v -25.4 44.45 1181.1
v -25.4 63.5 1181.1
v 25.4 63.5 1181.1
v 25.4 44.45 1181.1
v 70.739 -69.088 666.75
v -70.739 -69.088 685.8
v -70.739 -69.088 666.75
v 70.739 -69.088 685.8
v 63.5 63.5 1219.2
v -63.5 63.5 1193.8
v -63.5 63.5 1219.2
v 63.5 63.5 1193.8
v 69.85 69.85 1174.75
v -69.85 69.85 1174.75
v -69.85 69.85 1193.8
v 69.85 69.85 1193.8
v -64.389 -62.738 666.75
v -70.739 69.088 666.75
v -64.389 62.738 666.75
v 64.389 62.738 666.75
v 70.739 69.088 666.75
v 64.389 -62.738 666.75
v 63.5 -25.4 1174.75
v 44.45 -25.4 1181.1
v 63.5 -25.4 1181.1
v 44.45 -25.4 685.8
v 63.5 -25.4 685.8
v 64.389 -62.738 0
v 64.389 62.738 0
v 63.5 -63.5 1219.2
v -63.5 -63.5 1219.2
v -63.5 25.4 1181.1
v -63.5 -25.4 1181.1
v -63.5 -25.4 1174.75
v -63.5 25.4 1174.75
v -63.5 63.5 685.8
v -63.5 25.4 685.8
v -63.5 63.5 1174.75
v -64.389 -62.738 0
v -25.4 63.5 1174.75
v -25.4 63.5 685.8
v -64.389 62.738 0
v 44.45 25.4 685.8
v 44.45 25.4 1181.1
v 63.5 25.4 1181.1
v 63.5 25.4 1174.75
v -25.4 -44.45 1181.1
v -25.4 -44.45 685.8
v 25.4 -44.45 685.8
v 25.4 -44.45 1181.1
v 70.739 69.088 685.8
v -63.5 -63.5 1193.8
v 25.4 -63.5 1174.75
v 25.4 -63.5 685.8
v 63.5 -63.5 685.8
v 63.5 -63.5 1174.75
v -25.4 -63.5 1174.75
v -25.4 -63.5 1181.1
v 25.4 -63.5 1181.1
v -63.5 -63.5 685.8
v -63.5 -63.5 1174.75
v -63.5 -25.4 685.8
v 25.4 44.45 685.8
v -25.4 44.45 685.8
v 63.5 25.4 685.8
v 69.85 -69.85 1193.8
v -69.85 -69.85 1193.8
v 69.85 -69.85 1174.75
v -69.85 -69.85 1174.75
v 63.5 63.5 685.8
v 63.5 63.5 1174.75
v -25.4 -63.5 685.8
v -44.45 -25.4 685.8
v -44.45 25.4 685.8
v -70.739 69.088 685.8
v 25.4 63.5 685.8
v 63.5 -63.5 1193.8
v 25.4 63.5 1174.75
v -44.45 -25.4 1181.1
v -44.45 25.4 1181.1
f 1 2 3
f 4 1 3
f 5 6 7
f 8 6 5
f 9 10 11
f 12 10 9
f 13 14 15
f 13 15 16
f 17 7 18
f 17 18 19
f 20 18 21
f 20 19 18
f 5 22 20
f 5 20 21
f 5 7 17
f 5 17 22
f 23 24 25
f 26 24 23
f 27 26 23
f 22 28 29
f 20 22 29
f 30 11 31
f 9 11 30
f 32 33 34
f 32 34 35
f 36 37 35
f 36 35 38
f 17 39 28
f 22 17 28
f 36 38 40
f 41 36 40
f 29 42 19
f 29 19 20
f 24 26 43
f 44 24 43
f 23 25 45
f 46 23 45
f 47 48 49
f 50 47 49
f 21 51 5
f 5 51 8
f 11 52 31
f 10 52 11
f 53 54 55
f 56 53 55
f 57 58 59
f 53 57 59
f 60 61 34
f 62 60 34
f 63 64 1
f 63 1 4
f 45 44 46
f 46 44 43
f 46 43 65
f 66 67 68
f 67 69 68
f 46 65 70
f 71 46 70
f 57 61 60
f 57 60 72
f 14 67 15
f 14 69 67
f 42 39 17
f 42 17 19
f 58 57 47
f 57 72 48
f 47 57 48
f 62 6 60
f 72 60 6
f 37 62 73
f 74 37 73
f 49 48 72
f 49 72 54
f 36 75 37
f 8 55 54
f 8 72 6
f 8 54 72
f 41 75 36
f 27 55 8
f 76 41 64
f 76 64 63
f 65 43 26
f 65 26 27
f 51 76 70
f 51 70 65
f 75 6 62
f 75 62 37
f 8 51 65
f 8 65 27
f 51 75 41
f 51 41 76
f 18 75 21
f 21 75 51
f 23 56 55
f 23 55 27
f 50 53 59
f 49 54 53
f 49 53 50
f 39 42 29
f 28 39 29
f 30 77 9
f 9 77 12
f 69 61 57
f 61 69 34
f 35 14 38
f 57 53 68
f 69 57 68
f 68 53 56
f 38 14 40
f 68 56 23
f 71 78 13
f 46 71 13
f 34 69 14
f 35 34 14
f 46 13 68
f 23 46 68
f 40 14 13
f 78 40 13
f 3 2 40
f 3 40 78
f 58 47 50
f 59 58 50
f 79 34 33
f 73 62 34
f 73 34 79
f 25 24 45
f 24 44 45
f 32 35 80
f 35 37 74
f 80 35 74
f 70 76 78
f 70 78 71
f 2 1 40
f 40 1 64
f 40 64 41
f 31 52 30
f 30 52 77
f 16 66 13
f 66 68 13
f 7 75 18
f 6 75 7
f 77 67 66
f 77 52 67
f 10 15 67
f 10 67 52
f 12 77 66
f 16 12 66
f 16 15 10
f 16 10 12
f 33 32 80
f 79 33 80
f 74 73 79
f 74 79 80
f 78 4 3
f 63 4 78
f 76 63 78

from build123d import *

# Parameters (mm, degrees)
F0_W      = 128.778
F0_H      = 125.476
F1_DEPTH  = 673.1
F2_W      = 88.9
F2_H      = 88.9
F3_DEPTH  = 508
F4_W      = 141.477994
F4_H      = 138.175994
F4_W_2    = 88.9
F4_H_2    = 88.9
F5_DEPTH  = 12.7
F6_W      = 141.477994
F6_H      = 138.175994
F6_W_2    = 128.778
F6_H_2    = 125.476
F7_DEPTH  = 6.35
F8_W      = 38.1
F8_H      = 38.1
F9_DEPTH  = 495.3
F10_W     = 139.7
F10_H     = 139.7
F10_W_2   = 127
F10_H_2   = 127
F11_DEPTH = 6.35
F12_W     = 139.7
F12_H     = 139.7
F13_DEPTH = 12.7
F14_W     = 127
F14_H     = 127
F15_DEPTH = 25.4


with BuildPart() as f1:
    # F0 (on Top) → F1 (new body)
    with BuildSketch(Plane.XY):
        Rectangle(F0_W, F0_H)
    extrude(amount=F1_DEPTH)

    # F2 (on face) → F3 (join)
    with BuildSketch(Plane.XY.offset(673.1)):
        Rectangle(F2_W, F2_H)
    extrude(amount=F3_DEPTH)

    # F4 (on face) → F5 (join)
    with BuildSketch(Plane.XY.offset(673.1)):
        Rectangle(F4_W, F4_H)
        Rectangle(F4_W_2, F4_H_2, mode=Mode.SUBTRACT)
    extrude(amount=F5_DEPTH)

    # F6 (on face) → F7 (join)
    with BuildSketch(Plane(origin=(0, 0, 673.1), x_dir=(1, 0, 0), z_dir=(0, 0, -1))):
        Rectangle(F6_W, F6_H)
        Rectangle(F6_W_2, F6_H_2, mode=Mode.SUBTRACT)
    extrude(amount=F7_DEPTH)

    # F8 (on face) → F9 (join)
    with BuildSketch(Plane.XY.offset(685.8)):
        with Locations((44.45, 44.45)):
            Rectangle(F8_W, F8_H)
        with Locations((44.45, -44.45)):
            Rectangle(F8_W, F8_H)
        with Locations((-44.45, -44.45)):
            Rectangle(F8_W, F8_H)
        with Locations((-44.45, 44.45)):
            Rectangle(F8_W, F8_H)
    extrude(amount=F9_DEPTH)

    # F10 (on face) → F11 (join)
    with BuildSketch(Plane.XY.offset(1181.1)):
        Rectangle(F10_W, F10_H)
        Rectangle(F10_W_2, F10_H_2, mode=Mode.SUBTRACT)
    extrude(amount=-F11_DEPTH)

    # F12 (on face) → F13 (join)
    with BuildSketch(Plane.XY.offset(1181.1)):
        Rectangle(F12_W, F12_H)
    extrude(amount=F13_DEPTH)

    # F14 (on face) → F15 (join)
    with BuildSketch(Plane.XY.offset(1193.8)):
        Rectangle(F14_W, F14_H)
    extrude(amount=F15_DEPTH)


solid = f1.part
